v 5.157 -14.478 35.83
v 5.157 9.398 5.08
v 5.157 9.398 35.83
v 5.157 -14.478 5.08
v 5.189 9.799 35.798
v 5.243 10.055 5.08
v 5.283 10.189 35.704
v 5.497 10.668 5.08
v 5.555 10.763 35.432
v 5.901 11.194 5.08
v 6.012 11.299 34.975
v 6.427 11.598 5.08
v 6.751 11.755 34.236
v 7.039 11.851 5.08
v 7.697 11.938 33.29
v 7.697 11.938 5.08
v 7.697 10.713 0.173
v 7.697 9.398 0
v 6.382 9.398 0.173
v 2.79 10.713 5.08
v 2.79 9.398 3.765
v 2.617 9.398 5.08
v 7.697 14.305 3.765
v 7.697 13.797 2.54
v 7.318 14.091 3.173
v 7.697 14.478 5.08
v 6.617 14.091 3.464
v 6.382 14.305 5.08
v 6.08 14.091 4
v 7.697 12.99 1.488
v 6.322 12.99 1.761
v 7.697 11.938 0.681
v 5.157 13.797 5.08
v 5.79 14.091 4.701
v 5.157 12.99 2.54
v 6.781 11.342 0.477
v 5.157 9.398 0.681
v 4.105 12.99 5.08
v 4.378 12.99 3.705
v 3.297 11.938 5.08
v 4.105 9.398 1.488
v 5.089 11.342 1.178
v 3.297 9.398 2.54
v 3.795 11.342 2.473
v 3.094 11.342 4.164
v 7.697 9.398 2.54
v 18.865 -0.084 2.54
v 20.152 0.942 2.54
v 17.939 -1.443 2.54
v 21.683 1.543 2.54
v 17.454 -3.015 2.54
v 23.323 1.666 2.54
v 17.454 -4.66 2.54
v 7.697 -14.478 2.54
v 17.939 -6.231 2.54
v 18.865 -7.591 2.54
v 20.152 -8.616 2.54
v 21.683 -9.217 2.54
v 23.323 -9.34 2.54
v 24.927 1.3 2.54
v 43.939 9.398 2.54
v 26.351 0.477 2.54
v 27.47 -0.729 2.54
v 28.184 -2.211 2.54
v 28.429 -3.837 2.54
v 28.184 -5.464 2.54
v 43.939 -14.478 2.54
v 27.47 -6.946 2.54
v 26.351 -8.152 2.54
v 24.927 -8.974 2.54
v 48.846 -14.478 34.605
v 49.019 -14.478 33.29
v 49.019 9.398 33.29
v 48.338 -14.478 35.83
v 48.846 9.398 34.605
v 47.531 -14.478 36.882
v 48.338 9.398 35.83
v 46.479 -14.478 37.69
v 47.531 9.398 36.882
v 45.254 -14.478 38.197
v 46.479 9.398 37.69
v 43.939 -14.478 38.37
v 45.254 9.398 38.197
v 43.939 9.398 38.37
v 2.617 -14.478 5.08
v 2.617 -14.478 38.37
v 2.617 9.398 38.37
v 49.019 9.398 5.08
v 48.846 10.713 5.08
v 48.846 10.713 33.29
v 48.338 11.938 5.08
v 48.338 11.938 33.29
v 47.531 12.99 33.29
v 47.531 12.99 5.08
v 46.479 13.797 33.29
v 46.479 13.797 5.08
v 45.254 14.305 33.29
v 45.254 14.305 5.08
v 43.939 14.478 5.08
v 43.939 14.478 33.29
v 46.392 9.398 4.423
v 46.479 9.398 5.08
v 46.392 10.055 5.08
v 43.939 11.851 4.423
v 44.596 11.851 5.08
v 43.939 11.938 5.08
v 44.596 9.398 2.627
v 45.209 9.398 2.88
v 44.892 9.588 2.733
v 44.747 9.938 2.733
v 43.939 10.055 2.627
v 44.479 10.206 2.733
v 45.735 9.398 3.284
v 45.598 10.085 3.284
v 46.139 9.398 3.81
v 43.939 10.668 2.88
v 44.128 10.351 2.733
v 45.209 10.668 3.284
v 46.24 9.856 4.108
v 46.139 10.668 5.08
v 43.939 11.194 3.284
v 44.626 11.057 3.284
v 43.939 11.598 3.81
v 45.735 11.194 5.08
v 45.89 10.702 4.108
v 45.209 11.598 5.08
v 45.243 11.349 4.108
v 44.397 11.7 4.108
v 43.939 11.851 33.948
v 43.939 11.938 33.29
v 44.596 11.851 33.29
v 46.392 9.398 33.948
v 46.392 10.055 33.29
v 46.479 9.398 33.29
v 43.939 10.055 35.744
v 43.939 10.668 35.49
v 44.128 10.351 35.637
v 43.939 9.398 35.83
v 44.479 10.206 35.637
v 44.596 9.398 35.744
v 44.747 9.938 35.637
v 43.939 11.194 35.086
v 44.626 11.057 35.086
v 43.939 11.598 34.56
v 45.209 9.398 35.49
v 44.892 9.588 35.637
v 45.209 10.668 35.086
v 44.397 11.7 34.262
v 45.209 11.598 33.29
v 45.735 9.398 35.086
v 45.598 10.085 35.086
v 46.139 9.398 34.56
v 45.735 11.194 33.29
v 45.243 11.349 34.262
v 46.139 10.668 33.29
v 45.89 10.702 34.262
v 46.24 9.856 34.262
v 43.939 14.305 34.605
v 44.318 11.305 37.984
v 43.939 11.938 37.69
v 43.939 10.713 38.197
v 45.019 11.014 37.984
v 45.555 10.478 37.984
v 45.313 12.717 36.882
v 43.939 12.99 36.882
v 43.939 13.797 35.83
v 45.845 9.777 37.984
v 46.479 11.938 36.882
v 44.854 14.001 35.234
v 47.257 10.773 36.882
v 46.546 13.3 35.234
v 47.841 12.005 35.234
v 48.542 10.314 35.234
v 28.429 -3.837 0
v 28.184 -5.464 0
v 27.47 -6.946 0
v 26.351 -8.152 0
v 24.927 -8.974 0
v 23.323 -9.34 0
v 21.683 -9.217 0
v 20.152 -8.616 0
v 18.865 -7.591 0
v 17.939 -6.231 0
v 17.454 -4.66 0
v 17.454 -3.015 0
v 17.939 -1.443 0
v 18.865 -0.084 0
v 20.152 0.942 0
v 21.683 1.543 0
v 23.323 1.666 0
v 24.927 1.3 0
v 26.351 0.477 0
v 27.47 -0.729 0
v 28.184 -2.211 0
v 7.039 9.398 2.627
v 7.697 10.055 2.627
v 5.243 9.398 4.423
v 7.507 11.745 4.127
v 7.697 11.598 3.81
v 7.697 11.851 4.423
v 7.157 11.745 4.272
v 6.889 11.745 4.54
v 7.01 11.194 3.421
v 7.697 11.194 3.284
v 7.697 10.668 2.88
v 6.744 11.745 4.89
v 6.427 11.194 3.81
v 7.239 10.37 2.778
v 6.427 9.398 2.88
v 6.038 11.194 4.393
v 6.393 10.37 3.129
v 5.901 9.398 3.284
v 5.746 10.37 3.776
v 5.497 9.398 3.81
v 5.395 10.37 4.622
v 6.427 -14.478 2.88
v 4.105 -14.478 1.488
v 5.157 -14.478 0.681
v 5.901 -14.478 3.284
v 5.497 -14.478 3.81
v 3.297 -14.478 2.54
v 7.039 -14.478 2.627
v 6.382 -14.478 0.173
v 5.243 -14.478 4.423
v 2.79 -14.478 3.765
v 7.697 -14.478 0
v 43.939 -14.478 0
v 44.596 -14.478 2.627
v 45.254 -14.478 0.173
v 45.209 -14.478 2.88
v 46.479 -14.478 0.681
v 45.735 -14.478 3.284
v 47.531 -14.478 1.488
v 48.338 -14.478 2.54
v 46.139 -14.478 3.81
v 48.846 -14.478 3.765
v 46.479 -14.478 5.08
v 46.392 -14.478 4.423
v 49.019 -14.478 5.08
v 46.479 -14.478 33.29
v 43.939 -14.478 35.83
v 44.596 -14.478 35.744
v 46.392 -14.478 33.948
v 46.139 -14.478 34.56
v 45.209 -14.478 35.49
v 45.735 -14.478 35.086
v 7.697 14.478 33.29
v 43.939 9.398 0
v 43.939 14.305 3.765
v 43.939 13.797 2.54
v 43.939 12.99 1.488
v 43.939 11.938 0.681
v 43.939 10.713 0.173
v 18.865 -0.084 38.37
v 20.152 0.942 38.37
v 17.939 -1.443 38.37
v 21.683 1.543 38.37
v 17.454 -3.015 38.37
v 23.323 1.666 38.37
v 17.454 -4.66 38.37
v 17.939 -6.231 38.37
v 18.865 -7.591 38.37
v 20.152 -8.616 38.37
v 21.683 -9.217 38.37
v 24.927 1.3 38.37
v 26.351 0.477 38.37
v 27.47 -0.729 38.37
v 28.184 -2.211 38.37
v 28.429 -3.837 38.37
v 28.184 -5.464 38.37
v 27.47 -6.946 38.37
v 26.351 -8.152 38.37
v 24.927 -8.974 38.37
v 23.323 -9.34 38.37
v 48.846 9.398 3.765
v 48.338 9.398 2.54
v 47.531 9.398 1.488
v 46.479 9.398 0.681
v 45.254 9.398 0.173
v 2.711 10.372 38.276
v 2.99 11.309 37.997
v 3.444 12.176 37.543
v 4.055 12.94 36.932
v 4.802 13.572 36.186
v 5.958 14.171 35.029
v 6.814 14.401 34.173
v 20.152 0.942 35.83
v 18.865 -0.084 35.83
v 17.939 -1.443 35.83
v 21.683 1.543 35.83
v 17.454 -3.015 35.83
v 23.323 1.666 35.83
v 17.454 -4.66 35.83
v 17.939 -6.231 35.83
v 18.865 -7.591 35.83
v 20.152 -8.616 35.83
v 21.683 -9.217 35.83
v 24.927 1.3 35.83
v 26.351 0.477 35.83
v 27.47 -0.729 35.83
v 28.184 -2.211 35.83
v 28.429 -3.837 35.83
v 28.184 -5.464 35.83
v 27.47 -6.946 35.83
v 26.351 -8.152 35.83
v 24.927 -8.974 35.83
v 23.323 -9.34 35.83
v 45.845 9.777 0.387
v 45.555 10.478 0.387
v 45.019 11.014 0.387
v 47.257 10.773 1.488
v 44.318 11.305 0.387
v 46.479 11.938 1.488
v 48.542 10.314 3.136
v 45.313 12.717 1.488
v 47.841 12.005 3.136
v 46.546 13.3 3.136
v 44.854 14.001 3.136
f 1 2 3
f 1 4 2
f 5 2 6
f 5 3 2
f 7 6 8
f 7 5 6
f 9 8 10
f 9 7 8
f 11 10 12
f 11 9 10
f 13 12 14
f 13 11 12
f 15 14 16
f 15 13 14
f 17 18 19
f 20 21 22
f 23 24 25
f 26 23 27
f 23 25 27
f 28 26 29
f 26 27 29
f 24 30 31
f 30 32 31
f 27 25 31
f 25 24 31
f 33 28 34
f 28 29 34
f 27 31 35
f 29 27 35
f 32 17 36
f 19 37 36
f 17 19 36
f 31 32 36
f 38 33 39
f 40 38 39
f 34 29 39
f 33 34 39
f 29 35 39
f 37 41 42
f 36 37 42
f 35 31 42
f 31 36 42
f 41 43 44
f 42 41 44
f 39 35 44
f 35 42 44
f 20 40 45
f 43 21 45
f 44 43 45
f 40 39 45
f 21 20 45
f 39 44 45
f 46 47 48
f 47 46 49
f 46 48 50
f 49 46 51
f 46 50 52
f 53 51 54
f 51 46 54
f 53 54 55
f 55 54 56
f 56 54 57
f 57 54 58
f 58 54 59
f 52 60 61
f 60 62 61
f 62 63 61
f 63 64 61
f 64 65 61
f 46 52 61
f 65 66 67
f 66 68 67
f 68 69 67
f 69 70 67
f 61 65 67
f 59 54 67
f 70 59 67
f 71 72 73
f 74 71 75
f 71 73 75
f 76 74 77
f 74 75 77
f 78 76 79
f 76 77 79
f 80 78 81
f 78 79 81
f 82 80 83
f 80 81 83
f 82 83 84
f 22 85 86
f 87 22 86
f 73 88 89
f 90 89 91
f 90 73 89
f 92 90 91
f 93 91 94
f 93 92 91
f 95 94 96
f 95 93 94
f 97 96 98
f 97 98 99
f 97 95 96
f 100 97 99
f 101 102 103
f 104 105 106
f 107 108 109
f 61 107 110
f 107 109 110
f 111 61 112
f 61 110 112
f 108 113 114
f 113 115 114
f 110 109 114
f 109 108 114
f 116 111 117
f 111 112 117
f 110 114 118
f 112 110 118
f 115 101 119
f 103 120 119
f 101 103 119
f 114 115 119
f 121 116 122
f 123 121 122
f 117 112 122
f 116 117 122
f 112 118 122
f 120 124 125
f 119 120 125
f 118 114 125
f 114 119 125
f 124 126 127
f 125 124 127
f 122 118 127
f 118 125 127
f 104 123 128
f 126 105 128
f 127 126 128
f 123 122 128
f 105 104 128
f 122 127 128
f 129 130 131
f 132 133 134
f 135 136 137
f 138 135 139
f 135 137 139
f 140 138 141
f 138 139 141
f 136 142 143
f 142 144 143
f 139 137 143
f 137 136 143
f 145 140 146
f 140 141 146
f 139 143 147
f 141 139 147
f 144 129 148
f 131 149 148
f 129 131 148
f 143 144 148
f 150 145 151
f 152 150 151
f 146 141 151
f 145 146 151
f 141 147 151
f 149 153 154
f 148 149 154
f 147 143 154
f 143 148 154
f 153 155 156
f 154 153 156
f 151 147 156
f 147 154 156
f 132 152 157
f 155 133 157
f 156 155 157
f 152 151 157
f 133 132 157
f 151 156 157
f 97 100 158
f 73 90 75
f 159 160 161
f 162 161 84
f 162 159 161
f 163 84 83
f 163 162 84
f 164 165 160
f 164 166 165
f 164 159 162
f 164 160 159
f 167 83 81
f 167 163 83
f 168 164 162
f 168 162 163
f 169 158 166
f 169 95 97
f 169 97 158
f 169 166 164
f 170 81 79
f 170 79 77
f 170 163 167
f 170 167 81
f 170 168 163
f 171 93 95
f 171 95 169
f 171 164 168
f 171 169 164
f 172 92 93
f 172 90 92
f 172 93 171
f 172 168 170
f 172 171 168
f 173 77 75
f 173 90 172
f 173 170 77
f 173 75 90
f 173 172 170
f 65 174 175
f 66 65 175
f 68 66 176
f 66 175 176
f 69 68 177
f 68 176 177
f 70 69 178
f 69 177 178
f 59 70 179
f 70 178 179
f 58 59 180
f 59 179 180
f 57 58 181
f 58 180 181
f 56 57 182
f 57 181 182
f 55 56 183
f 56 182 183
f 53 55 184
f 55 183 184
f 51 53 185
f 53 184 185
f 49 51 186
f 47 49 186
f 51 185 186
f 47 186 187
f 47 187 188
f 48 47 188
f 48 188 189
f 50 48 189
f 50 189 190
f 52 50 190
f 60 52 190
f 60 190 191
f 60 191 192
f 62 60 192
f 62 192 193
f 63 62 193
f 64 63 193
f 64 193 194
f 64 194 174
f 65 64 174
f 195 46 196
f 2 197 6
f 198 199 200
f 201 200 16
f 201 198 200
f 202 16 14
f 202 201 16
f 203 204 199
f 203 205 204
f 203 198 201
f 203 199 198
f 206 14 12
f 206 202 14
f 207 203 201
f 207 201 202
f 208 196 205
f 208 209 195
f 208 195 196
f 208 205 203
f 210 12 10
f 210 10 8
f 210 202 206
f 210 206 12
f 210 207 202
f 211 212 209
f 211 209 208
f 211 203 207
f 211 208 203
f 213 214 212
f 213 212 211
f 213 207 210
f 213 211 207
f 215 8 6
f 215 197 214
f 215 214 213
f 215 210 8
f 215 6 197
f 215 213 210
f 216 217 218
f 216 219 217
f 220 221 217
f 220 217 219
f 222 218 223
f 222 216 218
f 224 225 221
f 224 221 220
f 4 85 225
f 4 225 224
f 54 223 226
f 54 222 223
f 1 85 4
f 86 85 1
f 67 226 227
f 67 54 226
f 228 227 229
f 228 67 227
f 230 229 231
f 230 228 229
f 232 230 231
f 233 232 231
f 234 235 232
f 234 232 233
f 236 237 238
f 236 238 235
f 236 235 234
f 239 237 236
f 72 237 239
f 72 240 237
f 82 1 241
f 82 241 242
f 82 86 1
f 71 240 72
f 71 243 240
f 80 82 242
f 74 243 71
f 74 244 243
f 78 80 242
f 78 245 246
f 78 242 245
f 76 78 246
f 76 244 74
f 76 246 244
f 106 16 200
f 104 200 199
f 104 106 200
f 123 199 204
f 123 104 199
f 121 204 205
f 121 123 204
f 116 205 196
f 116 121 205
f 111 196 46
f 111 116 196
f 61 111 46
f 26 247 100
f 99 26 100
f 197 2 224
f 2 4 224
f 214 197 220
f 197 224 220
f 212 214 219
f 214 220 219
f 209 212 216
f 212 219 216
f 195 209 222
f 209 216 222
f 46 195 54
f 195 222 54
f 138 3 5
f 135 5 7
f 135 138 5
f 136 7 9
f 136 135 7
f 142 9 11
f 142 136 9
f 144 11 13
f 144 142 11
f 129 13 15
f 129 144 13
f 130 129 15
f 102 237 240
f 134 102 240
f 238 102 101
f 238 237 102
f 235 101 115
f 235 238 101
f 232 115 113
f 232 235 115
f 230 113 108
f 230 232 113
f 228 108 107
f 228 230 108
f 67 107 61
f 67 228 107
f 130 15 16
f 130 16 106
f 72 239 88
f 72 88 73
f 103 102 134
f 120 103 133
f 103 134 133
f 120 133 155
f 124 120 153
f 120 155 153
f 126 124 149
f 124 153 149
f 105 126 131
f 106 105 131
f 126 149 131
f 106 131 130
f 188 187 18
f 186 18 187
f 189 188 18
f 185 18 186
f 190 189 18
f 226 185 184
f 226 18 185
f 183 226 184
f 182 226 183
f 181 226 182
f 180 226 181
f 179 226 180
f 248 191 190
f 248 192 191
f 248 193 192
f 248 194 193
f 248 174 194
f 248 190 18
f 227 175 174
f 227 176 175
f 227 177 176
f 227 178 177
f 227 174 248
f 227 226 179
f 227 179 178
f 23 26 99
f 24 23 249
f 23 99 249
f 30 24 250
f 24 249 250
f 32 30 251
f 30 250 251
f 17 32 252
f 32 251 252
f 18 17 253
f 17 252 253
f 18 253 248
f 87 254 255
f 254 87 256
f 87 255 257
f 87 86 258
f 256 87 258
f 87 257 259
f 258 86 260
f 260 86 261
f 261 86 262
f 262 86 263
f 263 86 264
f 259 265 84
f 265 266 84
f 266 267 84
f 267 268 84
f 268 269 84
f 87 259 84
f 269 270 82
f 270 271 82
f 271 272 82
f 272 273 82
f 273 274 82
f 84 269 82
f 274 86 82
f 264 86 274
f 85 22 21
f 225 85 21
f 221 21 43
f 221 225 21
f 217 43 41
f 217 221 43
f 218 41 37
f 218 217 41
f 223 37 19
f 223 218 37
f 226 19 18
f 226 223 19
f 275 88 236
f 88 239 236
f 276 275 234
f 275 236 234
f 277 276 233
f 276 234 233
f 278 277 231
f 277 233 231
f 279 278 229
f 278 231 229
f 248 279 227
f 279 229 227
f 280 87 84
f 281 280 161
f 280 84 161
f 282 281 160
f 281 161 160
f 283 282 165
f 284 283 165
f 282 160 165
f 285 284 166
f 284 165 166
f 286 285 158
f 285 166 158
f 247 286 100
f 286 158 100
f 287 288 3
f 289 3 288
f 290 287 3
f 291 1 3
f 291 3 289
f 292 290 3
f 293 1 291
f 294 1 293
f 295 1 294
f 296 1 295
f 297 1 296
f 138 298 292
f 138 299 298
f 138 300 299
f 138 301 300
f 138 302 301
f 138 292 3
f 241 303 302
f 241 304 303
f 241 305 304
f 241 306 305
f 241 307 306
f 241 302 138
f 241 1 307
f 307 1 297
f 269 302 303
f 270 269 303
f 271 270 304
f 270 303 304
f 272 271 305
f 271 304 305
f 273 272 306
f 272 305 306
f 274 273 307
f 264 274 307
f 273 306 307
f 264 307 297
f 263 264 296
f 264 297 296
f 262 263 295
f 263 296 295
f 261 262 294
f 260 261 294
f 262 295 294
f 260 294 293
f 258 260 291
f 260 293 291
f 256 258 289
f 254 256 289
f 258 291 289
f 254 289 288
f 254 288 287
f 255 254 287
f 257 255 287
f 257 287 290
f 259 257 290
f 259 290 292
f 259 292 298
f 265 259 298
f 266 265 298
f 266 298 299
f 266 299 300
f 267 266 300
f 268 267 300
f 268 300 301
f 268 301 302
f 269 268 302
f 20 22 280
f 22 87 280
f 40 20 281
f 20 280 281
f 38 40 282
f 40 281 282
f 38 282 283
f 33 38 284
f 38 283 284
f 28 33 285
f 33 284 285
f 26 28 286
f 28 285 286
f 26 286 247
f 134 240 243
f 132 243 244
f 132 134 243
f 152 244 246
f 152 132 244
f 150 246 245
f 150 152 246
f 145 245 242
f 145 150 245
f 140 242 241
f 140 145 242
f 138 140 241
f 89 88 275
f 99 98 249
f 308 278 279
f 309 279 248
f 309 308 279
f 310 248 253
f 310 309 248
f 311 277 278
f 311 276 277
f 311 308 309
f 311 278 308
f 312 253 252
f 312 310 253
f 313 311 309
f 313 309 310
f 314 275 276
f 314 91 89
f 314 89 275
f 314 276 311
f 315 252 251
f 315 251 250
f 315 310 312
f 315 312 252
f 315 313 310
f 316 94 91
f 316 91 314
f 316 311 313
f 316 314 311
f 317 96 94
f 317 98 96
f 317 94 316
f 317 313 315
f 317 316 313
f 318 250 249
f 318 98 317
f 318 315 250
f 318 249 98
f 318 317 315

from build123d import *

# Parameters (mm, degrees)
F0_W     = 46.4019156061
F0_H     = 38.3702367544
F1_DEPTH = 14.478
F2_R     = 5.08
F3_T     = -2.54
F4_R     = 5.5182295765
F5_DEPTH = 38.862


with BuildPart() as f1:
    # F0 (on Front) → F1 (new body, symmetric)
    with BuildSketch(Plane.XZ):
        with Locations((25.8178424556, 19.1851183772)):
            Rectangle(F0_W, F0_H)
    extrude(amount=F1_DEPTH, both=True)

    # F2
    f2_edges = [f1.edges().sort_by_distance(p)[0] for p in [
        (49.0188, 14.478, 19.185118),
        (49.0188, 0, 0),
        (2.616885, 0, 0),
        (25.817842, 14.478, 0),
        (2.616885, 14.478, 19.185118),
        (25.817842, 14.478, 38.370237),
        (49.0188, 0, 38.370237),
    ]]
    fillet(f2_edges, radius=F2_R)

    # F3
    f3_openings = [f1.faces().sort_by_distance(p)[0] for p in [
        (25.748559, -14.478, 19.241793),
    ]]
    offset(amount=F3_T, openings=f3_openings)

    # F4 (on face) → F5 (cut)
    with BuildSketch(Plane(origin=(0, 0, 0), x_dir=(1, 0, 0), z_dir=(0, 0, -1))):
        with Locations((22.9106154293, 3.8371770643)):
            Circle(F4_R)
    extrude(amount=-F5_DEPTH, mode=Mode.SUBTRACT)


solid = f1.part
